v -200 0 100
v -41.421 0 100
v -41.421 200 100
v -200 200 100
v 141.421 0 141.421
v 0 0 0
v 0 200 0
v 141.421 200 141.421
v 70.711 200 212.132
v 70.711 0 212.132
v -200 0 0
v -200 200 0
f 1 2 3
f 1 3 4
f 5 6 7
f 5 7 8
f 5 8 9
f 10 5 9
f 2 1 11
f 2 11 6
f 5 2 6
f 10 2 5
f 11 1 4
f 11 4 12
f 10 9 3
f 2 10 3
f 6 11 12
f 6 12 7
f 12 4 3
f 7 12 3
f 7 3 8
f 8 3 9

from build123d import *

# Parameters (mm, degrees)
PAD_DEPTH = 200


with BuildPart() as part:
    # Sketch → Pad (new body)
    with BuildSketch(Plane.XZ):
        Polygon((-200, 100), (-200, 0), (0, 0), (141.421356, 141.421356), (70.710678, 212.132034), (-41.421356, 100), align=None)
    extrude(amount=-PAD_DEPTH)


solid = part.part
